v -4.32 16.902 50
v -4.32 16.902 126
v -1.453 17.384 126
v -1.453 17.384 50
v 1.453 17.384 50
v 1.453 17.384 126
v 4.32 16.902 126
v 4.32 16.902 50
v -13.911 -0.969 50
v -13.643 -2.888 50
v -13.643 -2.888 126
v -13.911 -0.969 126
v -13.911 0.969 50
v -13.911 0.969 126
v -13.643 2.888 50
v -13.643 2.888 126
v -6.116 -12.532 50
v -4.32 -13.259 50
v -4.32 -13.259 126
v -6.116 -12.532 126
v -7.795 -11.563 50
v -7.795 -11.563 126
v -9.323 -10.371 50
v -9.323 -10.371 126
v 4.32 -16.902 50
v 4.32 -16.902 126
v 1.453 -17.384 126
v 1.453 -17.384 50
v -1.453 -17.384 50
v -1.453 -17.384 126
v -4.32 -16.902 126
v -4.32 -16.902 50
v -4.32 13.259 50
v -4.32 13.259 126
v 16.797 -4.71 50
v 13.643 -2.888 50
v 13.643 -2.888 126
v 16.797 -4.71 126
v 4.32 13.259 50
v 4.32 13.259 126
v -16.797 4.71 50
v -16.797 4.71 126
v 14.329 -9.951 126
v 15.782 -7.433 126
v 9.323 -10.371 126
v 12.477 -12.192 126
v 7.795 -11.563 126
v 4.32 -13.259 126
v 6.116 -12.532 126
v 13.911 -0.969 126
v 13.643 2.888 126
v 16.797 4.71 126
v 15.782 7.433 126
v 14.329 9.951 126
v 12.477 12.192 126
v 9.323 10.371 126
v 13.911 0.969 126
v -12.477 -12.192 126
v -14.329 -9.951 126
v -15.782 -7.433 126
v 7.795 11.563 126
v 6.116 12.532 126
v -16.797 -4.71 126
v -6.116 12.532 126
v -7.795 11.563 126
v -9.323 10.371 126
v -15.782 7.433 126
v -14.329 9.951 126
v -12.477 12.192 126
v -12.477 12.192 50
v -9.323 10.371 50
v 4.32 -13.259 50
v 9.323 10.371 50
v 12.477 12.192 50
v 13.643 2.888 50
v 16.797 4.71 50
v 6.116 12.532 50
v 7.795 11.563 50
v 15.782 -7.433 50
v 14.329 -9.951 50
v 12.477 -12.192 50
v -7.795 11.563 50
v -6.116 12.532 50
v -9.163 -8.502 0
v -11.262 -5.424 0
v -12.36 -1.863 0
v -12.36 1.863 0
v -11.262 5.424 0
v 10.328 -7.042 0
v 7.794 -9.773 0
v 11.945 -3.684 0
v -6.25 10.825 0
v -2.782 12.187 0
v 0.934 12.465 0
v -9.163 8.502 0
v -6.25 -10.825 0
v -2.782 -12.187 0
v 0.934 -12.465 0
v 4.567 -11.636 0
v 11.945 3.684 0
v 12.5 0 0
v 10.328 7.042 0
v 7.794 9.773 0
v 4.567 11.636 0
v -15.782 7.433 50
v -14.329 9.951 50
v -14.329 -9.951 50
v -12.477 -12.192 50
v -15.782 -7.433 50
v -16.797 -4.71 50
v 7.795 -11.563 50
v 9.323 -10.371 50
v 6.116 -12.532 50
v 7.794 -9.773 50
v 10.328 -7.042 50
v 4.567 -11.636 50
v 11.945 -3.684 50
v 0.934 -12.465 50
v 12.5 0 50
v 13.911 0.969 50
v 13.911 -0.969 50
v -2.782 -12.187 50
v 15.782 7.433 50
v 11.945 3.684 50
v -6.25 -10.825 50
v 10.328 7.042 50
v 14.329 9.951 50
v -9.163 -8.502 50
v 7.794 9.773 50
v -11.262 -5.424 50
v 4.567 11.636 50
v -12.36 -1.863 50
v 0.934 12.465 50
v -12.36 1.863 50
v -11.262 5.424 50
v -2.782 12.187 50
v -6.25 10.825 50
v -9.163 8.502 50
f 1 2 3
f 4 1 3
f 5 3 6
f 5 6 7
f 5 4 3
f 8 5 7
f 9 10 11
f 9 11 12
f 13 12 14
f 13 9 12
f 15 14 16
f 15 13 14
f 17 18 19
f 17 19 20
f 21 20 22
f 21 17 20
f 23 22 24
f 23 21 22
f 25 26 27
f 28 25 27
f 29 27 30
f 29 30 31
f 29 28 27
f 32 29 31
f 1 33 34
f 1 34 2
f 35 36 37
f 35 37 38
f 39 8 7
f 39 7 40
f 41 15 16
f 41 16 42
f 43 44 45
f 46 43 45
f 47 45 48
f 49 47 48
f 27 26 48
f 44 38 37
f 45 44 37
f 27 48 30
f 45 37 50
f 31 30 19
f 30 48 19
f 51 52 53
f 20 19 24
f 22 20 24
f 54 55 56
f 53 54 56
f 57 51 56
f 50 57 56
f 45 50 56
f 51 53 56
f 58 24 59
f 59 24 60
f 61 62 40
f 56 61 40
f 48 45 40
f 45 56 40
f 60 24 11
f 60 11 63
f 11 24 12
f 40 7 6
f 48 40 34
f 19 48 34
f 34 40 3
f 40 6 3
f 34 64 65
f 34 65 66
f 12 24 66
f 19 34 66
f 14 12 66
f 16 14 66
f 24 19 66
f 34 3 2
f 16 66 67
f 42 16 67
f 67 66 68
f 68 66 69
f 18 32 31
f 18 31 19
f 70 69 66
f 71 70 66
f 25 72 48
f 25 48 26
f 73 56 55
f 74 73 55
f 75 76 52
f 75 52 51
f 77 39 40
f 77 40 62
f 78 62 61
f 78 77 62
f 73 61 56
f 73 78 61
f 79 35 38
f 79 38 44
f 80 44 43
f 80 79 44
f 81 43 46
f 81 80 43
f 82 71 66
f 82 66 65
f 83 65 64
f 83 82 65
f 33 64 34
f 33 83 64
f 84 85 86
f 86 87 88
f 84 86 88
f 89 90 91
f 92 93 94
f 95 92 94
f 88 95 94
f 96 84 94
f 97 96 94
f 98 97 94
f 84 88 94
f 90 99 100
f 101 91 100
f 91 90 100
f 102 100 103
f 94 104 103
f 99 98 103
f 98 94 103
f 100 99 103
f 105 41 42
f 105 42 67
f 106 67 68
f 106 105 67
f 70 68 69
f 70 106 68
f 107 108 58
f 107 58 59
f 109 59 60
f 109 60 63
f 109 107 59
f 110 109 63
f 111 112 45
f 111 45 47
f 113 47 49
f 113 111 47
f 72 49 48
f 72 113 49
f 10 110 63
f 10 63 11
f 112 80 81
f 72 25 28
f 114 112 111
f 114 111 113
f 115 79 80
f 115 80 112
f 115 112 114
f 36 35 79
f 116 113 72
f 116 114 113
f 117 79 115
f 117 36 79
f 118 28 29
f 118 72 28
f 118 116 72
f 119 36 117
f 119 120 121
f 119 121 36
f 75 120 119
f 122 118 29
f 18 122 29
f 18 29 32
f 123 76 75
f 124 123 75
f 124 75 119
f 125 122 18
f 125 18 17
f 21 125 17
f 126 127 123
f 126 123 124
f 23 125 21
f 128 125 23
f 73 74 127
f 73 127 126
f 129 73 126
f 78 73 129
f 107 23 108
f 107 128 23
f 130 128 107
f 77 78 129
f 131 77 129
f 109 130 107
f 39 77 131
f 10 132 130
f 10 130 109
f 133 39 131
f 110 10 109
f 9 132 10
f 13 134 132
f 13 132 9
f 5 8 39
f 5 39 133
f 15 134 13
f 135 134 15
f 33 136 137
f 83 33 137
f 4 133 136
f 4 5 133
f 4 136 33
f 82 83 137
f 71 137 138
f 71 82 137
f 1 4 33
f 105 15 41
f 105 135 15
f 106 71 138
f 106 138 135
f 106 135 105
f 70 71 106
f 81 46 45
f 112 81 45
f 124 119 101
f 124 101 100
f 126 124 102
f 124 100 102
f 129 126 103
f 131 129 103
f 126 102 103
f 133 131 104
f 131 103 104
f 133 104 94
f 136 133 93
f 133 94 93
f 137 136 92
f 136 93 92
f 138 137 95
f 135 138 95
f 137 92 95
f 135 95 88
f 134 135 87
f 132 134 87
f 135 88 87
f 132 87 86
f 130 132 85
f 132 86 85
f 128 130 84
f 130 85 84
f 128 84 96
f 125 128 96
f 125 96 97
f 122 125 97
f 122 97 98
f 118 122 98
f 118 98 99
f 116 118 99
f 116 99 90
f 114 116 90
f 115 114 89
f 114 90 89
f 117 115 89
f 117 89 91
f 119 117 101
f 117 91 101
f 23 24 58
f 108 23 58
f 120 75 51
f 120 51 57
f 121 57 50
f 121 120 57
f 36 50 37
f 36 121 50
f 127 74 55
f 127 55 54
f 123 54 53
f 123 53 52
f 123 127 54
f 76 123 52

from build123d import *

# Parameters (mm, degrees)
SKETCH1_R           = 12.5
BOSS_EXTRUDE1_DEPTH = 50
BOSS_EXTRUDE2_DEPTH = 76


with BuildPart() as part:
    # Sketch1 → Boss-Extrude1 (new body)
    with BuildSketch(Plane.XY):
        Circle(SKETCH1_R)
    extrude(amount=BOSS_EXTRUDE1_DEPTH)

    # Sketch2 → Boss-Extrude2 (add)
    with BuildSketch(Plane.XY.offset(50)):
        with BuildLine():
            Line((9.322615937, 10.370721146), (12.477254481, 12.192052559))
            ThreePointArc((12.477254481, 12.192052559), (15.107813169, 8.7225), (16.797254481, 4.709593071))
            Line((16.797254481, 4.709593071), (13.642615937, 2.888261658))
            ThreePointArc((13.642615937, 2.888261658), (13.945, 0), (13.642615937, -2.888261658))
            Line((13.642615937, -2.888261658), (16.797254481, -4.709593071))
            ThreePointArc((16.797254481, -4.709593071), (15.107813169, -8.7225), (12.477254481, -12.192052559))
            Line((12.477254481, -12.192052559), (9.322615937, -10.370721146))
            ThreePointArc((9.322615937, -10.370721146), (6.9725, -12.076724256), (4.32, -13.258982804))
            Line((4.32, -13.258982804), (4.32, -16.90164563))
            ThreePointArc((4.32, -16.90164563), (0, -17.445), (-4.32, -16.90164563))
            Line((-4.32, -16.90164563), (-4.32, -13.258982804))
            ThreePointArc((-4.32, -13.258982804), (-6.9725, -12.076724256), (-9.322615937, -10.370721146))
            Line((-9.322615937, -10.370721146), (-12.477254481, -12.192052559))
            ThreePointArc((-12.477254481, -12.192052559), (-15.107813169, -8.7225), (-16.797254481, -4.709593071))
            Line((-16.797254481, -4.709593071), (-13.642615937, -2.888261658))
            ThreePointArc((-13.642615937, -2.888261658), (-13.945, 0), (-13.642615937, 2.888261658))
            Line((-13.642615937, 2.888261658), (-16.797254481, 4.709593071))
            ThreePointArc((-16.797254481, 4.709593071), (-15.107813169, 8.7225), (-12.477254481, 12.192052559))
            Line((-12.477254481, 12.192052559), (-9.322615937, 10.370721146))
            ThreePointArc((-9.322615937, 10.370721146), (-6.9725, 12.076724256), (-4.32, 13.258982804))
            Line((-4.32, 13.258982804), (-4.32, 16.90164563))
            ThreePointArc((-4.32, 16.90164563), (0, 17.445), (4.32, 16.90164563))
            Line((4.32, 16.90164563), (4.32, 13.258982804))
            ThreePointArc((4.32, 13.258982804), (6.9725, 12.076724256), (9.322615937, 10.370721146))
        make_face()
    extrude(amount=BOSS_EXTRUDE2_DEPTH)


solid = part.part
